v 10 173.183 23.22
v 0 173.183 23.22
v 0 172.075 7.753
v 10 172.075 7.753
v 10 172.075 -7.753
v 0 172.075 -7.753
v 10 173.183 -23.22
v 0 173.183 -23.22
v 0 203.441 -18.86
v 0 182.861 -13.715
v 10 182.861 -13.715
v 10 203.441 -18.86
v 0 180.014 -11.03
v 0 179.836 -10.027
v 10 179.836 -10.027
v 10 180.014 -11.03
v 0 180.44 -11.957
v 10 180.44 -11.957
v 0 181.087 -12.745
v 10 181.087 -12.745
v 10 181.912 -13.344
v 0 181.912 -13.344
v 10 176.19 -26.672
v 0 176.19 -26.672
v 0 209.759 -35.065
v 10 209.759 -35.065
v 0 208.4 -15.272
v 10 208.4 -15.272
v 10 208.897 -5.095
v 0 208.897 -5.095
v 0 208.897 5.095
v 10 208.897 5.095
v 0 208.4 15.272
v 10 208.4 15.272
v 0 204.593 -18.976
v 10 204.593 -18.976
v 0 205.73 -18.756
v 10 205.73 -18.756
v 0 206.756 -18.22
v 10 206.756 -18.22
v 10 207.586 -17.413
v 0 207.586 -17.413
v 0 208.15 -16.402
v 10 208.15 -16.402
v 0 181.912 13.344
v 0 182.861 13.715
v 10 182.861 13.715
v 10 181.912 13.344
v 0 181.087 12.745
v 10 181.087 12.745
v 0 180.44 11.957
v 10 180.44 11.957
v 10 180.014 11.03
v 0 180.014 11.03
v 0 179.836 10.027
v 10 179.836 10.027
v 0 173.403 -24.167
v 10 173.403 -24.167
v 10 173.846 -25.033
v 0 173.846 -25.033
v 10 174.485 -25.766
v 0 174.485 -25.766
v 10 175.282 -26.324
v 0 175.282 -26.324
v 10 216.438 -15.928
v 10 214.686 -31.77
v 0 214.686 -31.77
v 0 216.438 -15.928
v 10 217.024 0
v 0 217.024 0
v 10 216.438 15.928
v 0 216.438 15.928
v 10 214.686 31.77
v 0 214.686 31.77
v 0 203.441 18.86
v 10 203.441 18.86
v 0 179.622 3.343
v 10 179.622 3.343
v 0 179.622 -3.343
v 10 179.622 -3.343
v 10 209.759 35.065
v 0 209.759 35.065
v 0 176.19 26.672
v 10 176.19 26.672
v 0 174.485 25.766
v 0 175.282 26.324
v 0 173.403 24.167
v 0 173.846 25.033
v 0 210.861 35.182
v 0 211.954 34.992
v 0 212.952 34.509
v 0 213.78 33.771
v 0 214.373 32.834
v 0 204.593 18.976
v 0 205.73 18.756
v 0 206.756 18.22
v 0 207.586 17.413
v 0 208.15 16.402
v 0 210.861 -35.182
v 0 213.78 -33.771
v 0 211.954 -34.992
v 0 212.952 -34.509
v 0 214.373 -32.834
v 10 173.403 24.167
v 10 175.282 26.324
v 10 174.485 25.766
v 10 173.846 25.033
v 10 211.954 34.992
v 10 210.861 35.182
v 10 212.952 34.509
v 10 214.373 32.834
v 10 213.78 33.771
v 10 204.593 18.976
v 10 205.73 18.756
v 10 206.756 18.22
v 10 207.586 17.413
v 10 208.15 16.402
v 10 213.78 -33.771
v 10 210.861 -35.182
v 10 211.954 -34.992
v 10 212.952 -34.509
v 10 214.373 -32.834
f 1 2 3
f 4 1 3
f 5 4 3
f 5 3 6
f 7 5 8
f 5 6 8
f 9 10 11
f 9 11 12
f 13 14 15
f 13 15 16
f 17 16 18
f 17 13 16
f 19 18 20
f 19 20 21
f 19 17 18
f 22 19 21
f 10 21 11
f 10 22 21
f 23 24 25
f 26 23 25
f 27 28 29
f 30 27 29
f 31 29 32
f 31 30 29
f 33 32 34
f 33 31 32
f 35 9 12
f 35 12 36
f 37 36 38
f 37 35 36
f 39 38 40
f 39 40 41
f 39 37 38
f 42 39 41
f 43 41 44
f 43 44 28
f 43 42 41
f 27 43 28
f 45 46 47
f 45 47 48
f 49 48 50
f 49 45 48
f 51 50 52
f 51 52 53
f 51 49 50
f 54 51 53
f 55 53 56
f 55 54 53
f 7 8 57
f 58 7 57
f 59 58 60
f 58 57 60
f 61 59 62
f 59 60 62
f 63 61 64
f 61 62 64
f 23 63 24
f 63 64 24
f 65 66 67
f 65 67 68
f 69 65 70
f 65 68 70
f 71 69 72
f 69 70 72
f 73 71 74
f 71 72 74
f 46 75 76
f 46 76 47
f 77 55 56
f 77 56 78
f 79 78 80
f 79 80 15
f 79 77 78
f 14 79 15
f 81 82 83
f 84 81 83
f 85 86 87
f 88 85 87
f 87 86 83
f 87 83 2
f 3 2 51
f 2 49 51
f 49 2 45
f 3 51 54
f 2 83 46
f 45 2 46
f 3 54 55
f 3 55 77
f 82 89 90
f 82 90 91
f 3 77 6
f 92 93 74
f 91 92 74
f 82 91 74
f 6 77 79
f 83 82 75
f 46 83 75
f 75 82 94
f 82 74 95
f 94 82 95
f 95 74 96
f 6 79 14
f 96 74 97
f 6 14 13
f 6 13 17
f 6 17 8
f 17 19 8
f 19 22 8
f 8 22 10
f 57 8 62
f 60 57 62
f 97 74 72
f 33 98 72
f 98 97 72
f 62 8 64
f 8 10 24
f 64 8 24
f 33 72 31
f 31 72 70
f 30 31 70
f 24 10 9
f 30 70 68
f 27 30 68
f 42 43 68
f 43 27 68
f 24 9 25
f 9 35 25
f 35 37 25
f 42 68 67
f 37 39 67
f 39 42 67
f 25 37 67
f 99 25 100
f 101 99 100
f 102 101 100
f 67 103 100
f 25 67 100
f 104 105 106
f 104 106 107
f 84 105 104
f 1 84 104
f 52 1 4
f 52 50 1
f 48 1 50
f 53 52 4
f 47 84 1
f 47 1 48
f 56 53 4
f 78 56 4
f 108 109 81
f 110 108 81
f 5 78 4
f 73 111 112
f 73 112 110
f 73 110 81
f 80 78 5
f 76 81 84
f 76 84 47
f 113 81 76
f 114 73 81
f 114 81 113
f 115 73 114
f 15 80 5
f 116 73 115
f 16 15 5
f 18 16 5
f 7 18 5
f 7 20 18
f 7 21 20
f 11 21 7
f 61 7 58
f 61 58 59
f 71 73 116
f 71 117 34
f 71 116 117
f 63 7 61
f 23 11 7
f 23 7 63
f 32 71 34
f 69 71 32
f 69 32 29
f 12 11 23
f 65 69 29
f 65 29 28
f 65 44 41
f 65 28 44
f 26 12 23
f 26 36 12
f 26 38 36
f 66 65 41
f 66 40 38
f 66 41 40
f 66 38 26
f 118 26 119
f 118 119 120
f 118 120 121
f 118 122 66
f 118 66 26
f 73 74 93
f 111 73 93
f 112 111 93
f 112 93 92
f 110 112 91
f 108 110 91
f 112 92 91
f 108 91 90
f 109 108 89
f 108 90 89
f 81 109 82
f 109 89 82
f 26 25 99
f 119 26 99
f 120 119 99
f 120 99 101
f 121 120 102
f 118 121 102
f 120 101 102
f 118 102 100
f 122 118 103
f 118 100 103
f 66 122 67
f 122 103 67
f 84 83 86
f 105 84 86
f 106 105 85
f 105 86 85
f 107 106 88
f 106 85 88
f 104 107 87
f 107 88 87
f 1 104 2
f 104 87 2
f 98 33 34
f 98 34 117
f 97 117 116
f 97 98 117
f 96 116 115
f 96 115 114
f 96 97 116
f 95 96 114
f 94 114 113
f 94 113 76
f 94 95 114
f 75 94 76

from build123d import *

# Parameters (mm, degrees)
EXTRUDE_1_DEPTH = 10


with BuildPart() as part:
    # Эскиз1 → Вытянуть1 (new body)
    with BuildSketch(Plane(origin=(0, 0, 0), x_dir=(0, 0, -1), z_dir=(1, 0, 0))):
        with BuildLine():
            Line((26.672393858, 176.18957543), (35.064656469, 209.758625876))
            ThreePointArc((35.064656469, 209.758625876), (34.509070686, 212.952387038), (31.769638193, 214.68567742))
            ThreePointArc((31.769638193, 214.68567742), (0, 217.023616226), (-31.769638193, 214.68567742))
            ThreePointArc((-31.769638193, 214.68567742), (-34.509070686, 212.952387038), (-35.064656469, 209.758625876))
            Line((-35.064656469, 209.758625876), (-26.672393858, 176.18957543))
            ThreePointArc((-26.672393858, 176.18957543), (-25.418843537, 174.143301579), (-23.219791878, 173.182678407))
            ThreePointArc((-23.219791878, 173.182678407), (0, 171.936937008), (23.219791878, 173.182678407))
            ThreePointArc((23.219791878, 173.182678407), (25.418843537, 174.143301579), (26.672393858, 176.18957543))
        make_face()
        with BuildLine():
            Line((13.715292518, 182.861170071), (18.86026165, 203.441046598))
            ThreePointArc((18.86026165, 203.441046598), (18.220421187, 206.755900608), (15.272036319, 208.400491618))
            ThreePointArc((15.272036319, 208.400491618), (0, 208.959326186), (-15.272036319, 208.400491618))
            ThreePointArc((-15.272036319, 208.400491618), (-18.220421187, 206.755900608), (-18.86026165, 203.441046598))
            Line((-18.86026165, 203.441046598), (-13.715292518, 182.861170071))
            ThreePointArc((-13.715292518, 182.861170071), (-12.371326308, 180.738475491), (-10.026657624, 179.835920111))
            ThreePointArc((-10.026657624, 179.835920111), (0, 179.595223033), (10.026657624, 179.835920111))
            ThreePointArc((10.026657624, 179.835920111), (12.371326308, 180.738475491), (13.715292518, 182.861170071))
        make_face(mode=Mode.SUBTRACT)
    extrude(amount=EXTRUDE_1_DEPTH)


solid = part.part
